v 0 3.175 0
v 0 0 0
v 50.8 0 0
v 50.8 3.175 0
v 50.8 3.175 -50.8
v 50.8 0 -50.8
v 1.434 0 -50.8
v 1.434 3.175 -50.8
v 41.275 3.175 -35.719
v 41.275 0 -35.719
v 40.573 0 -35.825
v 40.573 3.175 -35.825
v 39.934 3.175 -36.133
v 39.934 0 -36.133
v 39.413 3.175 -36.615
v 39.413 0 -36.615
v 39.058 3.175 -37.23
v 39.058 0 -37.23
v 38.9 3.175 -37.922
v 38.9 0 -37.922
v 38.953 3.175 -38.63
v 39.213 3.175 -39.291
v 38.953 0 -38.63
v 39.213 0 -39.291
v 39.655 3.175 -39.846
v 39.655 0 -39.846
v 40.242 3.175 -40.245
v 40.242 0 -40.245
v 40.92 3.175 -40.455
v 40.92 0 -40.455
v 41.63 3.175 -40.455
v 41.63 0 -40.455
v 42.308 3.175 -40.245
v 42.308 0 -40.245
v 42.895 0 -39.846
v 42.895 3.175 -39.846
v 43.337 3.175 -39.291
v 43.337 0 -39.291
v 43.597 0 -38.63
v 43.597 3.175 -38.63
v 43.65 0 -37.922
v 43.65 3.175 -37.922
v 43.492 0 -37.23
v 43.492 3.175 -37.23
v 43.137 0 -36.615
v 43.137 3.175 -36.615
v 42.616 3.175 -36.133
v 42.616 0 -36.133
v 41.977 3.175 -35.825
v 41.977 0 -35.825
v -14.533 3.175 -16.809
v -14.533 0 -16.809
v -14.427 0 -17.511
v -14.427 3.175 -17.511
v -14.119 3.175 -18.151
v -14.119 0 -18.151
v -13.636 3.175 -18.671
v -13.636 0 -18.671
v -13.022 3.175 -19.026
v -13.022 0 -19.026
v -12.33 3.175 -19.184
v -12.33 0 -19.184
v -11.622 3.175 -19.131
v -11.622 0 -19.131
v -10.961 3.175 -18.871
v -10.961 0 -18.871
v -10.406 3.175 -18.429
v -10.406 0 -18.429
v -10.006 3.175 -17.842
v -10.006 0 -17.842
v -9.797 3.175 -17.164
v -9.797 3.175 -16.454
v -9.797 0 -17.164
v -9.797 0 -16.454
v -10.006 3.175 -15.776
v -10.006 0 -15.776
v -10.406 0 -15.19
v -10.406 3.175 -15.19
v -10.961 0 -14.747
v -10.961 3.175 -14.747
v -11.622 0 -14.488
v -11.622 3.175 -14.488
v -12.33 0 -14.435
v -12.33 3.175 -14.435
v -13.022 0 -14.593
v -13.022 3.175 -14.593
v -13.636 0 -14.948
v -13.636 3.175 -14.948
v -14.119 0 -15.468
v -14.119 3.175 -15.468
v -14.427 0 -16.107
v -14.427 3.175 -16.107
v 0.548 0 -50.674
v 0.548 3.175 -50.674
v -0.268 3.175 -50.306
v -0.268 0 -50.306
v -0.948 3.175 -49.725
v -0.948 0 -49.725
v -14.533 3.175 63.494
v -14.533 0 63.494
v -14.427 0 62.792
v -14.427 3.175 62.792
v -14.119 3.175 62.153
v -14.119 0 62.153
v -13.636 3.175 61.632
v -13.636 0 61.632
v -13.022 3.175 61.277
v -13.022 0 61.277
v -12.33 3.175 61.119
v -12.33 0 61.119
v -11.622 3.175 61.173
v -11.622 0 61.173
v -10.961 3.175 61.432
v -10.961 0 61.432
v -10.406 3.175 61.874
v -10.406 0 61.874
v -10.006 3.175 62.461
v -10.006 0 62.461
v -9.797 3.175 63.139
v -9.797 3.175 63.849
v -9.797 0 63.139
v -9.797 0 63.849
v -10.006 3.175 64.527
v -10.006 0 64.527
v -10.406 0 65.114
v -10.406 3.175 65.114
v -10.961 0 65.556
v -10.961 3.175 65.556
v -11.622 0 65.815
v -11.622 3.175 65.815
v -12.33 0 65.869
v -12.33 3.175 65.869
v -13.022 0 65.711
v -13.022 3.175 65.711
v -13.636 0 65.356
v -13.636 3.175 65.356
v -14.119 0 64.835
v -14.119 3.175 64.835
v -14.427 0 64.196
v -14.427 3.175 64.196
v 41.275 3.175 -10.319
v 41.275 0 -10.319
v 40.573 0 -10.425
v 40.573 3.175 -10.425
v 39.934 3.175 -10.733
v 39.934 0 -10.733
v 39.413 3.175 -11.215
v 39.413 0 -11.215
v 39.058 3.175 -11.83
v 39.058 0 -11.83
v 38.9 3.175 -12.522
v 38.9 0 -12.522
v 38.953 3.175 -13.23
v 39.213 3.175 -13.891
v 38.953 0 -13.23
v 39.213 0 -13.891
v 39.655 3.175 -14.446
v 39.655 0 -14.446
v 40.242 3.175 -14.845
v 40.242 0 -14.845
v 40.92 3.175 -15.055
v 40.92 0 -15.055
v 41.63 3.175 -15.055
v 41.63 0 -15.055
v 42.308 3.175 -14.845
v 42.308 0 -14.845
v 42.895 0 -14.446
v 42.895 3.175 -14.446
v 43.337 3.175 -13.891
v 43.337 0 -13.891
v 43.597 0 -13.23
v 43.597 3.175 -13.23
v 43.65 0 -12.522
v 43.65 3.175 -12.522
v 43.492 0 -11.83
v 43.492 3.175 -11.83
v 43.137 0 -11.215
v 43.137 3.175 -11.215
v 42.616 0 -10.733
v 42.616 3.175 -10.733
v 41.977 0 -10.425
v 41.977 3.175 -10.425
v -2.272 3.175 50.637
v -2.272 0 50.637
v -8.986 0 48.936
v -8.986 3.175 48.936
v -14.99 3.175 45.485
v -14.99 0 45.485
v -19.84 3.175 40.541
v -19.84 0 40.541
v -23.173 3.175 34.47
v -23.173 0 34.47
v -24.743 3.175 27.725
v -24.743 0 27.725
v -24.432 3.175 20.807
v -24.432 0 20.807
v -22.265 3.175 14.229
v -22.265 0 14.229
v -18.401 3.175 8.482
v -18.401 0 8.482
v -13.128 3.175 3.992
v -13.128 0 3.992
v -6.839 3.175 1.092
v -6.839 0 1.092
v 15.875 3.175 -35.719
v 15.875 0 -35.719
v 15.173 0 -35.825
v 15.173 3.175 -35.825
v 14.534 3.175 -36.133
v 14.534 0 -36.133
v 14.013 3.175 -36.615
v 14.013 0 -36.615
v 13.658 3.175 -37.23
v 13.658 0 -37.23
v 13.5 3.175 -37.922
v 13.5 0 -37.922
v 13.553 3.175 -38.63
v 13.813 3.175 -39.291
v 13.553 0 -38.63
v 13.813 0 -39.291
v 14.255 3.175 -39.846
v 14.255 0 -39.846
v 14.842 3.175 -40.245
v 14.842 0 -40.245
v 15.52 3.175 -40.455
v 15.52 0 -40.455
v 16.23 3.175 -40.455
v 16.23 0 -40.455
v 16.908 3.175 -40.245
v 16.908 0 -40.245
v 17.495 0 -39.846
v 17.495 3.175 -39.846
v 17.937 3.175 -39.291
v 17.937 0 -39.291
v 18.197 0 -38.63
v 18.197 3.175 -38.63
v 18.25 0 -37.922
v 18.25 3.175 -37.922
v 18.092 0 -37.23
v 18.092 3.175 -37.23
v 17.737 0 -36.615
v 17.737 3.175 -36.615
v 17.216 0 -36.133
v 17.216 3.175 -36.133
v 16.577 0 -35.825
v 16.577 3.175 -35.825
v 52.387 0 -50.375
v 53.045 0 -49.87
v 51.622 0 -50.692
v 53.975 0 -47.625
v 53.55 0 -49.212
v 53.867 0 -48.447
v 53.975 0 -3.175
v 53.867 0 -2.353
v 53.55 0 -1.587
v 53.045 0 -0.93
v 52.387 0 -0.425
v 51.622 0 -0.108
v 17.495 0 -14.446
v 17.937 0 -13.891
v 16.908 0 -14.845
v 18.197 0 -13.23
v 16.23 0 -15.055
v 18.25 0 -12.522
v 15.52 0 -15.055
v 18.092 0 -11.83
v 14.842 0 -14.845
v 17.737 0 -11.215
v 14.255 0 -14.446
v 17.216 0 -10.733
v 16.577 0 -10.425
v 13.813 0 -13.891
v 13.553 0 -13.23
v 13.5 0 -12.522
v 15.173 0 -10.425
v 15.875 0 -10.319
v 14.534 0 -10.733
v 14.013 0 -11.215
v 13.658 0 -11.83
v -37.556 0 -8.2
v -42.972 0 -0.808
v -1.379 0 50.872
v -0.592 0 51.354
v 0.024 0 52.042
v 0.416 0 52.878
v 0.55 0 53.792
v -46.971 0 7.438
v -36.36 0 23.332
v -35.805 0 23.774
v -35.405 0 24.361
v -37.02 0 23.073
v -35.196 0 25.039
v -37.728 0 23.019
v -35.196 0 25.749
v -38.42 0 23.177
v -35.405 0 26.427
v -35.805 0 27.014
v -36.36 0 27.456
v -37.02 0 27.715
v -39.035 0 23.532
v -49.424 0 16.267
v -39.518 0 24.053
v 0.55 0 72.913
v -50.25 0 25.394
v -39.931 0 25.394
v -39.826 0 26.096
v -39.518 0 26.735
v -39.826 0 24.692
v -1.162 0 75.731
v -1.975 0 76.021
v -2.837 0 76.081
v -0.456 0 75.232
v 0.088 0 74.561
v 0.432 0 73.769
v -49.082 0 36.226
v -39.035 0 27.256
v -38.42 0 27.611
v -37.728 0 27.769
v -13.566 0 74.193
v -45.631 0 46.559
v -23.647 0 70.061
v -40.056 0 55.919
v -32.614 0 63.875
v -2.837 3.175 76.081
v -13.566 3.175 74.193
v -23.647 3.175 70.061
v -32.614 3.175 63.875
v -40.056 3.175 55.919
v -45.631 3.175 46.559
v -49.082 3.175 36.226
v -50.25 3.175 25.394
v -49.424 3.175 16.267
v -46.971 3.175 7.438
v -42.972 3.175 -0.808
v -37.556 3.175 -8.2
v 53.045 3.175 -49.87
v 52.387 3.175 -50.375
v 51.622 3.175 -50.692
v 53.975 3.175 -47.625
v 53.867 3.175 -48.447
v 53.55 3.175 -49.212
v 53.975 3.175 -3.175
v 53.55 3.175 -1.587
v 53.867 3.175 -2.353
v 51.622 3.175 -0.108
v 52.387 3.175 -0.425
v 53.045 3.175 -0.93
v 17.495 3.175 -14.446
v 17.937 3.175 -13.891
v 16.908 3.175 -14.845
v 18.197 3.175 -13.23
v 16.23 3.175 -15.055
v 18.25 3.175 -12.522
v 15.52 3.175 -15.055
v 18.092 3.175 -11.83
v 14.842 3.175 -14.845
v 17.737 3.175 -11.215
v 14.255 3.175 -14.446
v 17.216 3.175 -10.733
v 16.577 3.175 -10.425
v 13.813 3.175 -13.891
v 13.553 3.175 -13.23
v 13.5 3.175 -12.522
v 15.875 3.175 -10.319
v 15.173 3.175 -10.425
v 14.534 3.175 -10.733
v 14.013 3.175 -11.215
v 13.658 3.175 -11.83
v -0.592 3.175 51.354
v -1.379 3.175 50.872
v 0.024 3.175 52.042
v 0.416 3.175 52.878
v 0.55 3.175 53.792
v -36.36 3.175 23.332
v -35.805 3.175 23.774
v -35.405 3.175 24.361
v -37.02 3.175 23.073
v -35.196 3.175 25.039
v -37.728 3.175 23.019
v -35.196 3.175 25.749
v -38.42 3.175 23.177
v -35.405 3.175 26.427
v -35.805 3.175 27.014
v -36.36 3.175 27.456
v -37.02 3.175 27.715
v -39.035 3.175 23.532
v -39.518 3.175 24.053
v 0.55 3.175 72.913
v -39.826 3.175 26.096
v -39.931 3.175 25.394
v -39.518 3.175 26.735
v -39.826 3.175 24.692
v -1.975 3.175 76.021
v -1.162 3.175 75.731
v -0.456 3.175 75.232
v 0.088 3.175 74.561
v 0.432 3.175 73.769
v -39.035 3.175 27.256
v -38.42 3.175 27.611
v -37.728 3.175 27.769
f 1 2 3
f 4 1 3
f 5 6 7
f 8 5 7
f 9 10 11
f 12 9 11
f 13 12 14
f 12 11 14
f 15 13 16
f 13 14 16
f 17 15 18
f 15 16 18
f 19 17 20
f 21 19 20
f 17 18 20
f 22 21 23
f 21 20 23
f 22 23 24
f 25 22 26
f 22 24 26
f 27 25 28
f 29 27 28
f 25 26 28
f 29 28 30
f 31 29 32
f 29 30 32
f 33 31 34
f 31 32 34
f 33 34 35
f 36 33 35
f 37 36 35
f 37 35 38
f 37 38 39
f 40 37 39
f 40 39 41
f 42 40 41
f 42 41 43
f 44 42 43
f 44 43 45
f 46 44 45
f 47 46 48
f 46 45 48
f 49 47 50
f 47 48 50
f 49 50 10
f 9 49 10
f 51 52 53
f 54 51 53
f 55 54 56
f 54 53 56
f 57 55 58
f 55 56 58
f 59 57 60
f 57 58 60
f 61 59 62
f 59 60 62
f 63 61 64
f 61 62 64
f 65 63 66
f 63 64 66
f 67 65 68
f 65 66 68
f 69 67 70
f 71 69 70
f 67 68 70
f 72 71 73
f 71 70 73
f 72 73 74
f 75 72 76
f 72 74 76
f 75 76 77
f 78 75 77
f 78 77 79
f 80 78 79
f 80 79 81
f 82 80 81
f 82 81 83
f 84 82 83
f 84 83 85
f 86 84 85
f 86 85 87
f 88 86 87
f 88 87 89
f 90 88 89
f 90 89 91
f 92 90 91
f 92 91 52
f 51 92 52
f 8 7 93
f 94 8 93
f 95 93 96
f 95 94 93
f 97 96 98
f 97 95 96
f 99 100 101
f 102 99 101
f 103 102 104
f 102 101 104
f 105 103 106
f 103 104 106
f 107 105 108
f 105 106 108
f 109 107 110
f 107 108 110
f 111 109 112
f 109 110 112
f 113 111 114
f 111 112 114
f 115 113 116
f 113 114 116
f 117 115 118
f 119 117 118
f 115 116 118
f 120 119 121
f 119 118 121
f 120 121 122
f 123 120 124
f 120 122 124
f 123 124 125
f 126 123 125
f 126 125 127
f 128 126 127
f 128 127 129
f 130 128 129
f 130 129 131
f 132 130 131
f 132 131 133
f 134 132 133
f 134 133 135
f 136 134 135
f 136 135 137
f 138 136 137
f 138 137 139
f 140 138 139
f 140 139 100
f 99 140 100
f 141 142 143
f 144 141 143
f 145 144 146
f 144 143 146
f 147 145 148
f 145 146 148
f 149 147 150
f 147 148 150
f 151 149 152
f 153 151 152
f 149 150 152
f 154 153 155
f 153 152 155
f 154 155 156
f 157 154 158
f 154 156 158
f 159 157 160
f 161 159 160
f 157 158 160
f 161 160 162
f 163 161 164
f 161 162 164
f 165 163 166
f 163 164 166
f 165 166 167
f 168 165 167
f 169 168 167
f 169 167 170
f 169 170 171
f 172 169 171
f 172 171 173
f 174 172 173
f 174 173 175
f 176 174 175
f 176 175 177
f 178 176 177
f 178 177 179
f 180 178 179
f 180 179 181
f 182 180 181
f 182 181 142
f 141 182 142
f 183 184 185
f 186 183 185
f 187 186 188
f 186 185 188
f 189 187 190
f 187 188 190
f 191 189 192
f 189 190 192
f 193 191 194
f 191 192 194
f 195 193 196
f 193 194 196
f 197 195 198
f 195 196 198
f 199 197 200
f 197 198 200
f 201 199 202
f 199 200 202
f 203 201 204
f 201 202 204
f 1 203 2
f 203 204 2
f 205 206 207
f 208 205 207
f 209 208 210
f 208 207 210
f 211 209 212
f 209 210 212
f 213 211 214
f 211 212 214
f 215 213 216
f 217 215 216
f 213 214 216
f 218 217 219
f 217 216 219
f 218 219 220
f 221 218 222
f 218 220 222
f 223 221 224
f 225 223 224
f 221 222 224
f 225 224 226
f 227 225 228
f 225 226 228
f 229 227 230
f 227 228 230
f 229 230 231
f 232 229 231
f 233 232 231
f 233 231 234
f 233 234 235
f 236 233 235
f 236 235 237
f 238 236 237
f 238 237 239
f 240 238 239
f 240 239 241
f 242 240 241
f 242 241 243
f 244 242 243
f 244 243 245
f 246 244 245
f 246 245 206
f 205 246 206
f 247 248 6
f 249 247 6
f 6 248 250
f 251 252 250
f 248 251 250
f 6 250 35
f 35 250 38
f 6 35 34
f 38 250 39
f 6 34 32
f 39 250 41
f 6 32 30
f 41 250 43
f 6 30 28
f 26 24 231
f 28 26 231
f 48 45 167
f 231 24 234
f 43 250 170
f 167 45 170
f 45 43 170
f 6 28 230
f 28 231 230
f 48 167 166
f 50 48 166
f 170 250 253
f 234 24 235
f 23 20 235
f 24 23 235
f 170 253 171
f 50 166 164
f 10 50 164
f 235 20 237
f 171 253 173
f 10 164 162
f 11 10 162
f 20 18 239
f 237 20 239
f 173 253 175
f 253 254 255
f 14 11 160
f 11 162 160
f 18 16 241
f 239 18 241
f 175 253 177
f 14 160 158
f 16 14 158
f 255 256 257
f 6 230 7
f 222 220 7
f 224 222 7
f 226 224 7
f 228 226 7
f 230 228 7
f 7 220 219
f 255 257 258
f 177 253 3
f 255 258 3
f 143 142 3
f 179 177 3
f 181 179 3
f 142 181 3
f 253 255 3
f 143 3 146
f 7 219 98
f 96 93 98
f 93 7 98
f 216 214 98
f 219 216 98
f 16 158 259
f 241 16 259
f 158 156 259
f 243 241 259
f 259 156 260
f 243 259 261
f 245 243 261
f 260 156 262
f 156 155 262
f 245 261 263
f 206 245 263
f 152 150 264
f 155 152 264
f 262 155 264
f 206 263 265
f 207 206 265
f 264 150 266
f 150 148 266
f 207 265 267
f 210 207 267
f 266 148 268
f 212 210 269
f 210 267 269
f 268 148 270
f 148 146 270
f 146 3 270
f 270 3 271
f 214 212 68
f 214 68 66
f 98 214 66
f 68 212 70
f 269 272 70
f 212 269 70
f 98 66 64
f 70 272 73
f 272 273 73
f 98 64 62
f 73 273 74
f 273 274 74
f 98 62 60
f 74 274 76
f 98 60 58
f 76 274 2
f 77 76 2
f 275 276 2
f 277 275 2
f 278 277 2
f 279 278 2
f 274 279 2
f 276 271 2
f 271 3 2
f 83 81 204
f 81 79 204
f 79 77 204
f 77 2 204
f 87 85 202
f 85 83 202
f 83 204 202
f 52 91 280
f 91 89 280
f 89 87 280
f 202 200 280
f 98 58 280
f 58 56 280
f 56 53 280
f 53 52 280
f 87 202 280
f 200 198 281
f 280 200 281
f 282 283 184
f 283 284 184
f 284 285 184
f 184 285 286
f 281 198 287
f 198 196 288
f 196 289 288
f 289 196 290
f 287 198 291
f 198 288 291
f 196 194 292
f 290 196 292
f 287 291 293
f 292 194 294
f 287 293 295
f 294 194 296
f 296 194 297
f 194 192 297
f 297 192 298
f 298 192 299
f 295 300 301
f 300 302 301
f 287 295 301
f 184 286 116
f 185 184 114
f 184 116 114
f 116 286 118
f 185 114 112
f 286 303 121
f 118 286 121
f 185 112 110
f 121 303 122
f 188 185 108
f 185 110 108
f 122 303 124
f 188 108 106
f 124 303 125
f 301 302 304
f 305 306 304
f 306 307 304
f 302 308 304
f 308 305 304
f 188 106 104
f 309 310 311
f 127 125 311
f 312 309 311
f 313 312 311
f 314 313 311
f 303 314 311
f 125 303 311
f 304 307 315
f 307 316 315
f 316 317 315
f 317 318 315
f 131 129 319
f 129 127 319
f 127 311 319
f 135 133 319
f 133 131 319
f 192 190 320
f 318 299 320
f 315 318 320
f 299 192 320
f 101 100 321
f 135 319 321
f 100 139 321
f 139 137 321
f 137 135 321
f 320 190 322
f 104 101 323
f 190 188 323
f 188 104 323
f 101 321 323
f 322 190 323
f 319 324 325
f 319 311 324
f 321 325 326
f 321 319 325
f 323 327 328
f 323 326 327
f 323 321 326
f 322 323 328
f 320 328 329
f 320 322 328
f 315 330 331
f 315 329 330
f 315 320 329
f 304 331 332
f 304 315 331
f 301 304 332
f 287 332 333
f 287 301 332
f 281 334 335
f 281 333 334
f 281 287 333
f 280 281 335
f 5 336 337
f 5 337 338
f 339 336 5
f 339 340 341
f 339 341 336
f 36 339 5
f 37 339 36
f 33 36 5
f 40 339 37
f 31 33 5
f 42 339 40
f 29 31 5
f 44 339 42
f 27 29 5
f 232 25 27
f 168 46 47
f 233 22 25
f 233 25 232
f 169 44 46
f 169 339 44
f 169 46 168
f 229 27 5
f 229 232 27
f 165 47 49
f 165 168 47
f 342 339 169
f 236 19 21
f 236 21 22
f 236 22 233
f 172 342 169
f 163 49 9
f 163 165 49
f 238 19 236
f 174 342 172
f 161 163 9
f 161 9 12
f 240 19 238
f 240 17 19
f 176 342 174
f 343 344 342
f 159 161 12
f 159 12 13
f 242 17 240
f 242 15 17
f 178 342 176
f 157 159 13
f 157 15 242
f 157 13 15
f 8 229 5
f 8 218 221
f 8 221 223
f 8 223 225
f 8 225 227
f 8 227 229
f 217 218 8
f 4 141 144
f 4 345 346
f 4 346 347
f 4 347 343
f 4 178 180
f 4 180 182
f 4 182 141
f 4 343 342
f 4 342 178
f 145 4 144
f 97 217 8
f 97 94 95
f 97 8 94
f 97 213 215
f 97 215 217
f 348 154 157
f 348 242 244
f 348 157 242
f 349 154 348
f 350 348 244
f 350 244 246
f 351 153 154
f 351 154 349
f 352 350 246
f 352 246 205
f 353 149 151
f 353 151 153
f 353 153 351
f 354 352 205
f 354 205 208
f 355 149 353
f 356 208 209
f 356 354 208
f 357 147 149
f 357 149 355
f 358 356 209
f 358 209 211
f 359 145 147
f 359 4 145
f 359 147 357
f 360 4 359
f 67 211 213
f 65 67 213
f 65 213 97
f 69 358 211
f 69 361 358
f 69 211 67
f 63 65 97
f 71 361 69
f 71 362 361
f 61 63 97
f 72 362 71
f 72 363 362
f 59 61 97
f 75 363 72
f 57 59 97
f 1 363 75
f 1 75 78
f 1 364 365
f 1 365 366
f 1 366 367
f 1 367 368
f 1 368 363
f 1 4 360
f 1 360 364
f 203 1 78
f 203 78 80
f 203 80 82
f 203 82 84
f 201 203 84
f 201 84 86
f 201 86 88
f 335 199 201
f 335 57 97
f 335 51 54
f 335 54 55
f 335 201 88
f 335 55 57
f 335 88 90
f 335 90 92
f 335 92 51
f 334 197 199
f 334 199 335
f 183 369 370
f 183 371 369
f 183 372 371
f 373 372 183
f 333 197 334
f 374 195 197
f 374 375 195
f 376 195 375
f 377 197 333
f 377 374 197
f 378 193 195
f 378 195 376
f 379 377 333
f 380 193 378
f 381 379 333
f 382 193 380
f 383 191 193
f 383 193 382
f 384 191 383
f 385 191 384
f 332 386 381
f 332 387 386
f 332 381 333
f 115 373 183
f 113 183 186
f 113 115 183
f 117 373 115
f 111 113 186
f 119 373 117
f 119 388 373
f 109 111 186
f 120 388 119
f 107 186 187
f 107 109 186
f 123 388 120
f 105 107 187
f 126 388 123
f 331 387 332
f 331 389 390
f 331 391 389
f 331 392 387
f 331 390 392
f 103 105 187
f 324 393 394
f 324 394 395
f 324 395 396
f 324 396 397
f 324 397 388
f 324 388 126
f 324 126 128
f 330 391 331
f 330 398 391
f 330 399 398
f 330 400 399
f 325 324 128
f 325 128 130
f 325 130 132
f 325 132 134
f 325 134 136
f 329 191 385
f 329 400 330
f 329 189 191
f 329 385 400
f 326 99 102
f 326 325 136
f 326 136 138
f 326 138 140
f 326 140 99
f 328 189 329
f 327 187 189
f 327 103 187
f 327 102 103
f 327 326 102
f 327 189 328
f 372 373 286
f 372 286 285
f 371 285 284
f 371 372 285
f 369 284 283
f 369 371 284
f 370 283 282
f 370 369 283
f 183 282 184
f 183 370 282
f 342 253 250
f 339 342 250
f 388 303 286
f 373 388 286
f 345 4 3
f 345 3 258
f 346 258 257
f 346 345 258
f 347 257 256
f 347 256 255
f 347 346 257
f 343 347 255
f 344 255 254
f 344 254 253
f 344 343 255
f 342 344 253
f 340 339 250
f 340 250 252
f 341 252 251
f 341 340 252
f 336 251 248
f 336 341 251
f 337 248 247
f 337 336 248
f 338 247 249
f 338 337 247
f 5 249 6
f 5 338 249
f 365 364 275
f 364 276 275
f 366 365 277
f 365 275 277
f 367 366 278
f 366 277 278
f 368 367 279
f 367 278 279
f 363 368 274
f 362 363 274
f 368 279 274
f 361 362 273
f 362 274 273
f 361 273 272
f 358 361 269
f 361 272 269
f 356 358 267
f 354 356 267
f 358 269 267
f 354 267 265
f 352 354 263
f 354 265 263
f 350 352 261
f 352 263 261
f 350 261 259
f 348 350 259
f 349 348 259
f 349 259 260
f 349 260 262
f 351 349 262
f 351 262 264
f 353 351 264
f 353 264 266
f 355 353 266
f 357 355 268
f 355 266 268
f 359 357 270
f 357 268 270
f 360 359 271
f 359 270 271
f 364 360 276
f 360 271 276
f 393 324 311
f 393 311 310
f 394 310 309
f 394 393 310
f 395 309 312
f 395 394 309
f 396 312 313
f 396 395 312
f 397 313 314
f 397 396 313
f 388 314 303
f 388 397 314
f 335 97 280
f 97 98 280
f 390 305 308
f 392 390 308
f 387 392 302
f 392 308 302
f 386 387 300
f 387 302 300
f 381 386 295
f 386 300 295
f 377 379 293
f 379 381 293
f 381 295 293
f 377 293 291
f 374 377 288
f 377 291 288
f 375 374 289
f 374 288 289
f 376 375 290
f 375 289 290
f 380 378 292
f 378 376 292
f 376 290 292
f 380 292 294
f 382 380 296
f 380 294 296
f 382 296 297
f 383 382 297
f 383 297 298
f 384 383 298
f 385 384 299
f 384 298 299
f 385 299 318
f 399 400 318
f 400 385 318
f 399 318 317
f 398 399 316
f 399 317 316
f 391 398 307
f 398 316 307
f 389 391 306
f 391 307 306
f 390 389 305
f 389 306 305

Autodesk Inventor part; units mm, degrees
ref_plane "YZ Plane" through (0, 0, 0) normal (1, 0, 0) x (0, 1, 0)
ref_plane "XZ Plane" through (0, 0, 0) normal (0, 1, 0) x (-1, 0, 0)
ref_plane "XY Plane" through (0, 0, 0) normal (0, 0, 1) x (1, 0, 0)
sketch "Sketch3" plane through (0, 0, 0) normal (0, 1, 0) x (-1, 0, 0)
  arc A0 (0, 0) -> (-0.5498, 50.794) centre (-0.5498, 25.394) ccw
  arc A1 (37.5561, -8.2003) -> (-0.5498, 76.194) centre (-0.5498, 25.394) ccw
  line L0 (0, 0) -> (-53.975, 0)
  line L1 (-53.975, 0) -> (-53.975, -50.8)
  line L2 (-53.975, -50.8) -> (0, -50.8)
  line L3 (0, -50.8) -> (37.5561, -8.2003)
  line L4 (-0.5498, 76.194) -> (-0.5498, 50.794)
  line L5 (50.2502, 25.394) -> (37.5502, 25.394)
  circle A2 centre (37.5502, 25.394) radius 2.3812
  line L6 (24.8487, 25.6689) -> (12.1517, 25.394)
  line L7 (12.1517, 25.394) -> (12.1517, 85.7885)
  line L8 (12.1517, 85.7885) -> (12.1517, 25.394)
  line L9 (12.1517, 25.394) -> (12.1517, -39.1077)
  line L10 (-0.5498, 63.494) -> (12.1517, 63.494)
  line L11 (12.1517, 3.3979) -> (12.1517, -37.0164)
  line L12 (12.1517, -16.8093) -> (14.0122, -16.8093)
  circle A3 centre (12.1517, -16.8093) radius 2.3812
  circle A4 centre (12.1517, 63.494) radius 2.3812
  dimension "d19" = 25.4
  dimension "d20" = 25.4
  dimension "d21" = 53.975
  dimension "d22" = 50.8
  dimension "d23" = 53.975
  dimension "d39" = 12.7
  dimension "d40" = 4.7625
  dimension "d42" = 12.7
  dimension "d43" = 4.7625
  dimension "d44" = 4.7625
extrude "Extrusion3" add sketch "Sketch3" along normal blind 3.175 contours A0 L9 A3 L3 L2 L1 L0 | A2 | A0 L7 A4 A1 L3 L9 A3 | A3 L9 | L9 A3 | A0 L4 L10 A4 L7 | A4 L10 L7 | L7 A4 | L4 A1 L7 A4 L10 | L10 A4 L7
fillet "Fillet3" radius 3.175 5 edges at (0, 1.5875, -50.8) (53.975, 1.5875, -50.8) (53.975, 1.5875, 0) (0.5498, 1.5875, 50.794) (0.5498, 1.5875, 76.194)
sketch "Sketch4" plane through (0, 3.175, 0) normal (0, 1, 0) x (1, 0, 0)
  line L0 (53.975, 3.175) -> (53.975, 47.625) projected
  line L1 (53.975, 25.4) -> (41.275, 25.4)
  line L2 (41.275, 25.4) -> (41.275, 38.1)
  line L3 (41.275, 38.1) -> (41.275, 12.7)
  line L4 (41.275, 12.7) -> (15.875, 12.7)
  point P0 (0, 0)
  point P1 (15.875, 38.1)
  dimension "d27" = 12.7
  dimension "d28" = 12.7
  dimension "d29" = 25.4
  dimension "d30" = 25.4
  dimension "d31" = 25.4
hole "Hole1" at (15.875, 3.175, -38.1) at (15.875, 3.175, -12.7) at (41.275, 3.175, -12.7) at (41.275, 3.175, -38.1) direction (0, -1, 0) diameter 4.7625 end through all
extrude "Extrusion4" cut sketch "Sketch3" along normal blind 3.175 contours A2 | A3 L9 | L9 A3 | A4 L10 L7 | L7 A4 | L10 A4 L7
properties part number "hook v2"
